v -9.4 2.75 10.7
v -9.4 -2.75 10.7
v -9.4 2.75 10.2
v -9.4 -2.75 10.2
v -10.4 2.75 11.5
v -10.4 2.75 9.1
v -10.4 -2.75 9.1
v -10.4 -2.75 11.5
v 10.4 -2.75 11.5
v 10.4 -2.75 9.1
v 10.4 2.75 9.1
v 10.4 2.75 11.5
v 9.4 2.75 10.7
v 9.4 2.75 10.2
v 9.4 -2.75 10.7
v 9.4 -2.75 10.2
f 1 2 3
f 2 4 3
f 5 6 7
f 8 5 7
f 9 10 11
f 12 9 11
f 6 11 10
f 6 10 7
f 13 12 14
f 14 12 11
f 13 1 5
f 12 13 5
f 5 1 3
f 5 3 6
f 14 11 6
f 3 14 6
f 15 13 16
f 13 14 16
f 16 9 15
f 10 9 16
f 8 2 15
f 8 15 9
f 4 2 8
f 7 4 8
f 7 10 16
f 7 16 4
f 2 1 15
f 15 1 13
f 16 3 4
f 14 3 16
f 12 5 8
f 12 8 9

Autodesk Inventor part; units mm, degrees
ref_plane "YZ Plane" through (0, 0, 0) normal (1, 0, 0) x (0, 1, 0)
ref_plane "XZ Plane" through (0, 0, 0) normal (0, 1, 0) x (-1, 0, 0)
sketch "Sketch1" plane through (0, 0, 0) normal (0, 0, 1) x (1, 0, 0)
  line L0 (-10.4, -2.75) -> (10.4, -2.75)
  line L1 (10.4, -2.75) -> (10.4, 2.75)
  line L2 (10.4, 2.75) -> (-10.4, 2.75)
  line L3 (-10.4, 2.75) -> (-10.4, -2.75)
  point P0 (0, 0)
  dimension "d268" = 5.5
  dimension "d269" = 2.75
  dimension "d270" = 20.8
  dimension "d271" = 10.4
extrude "Extrusion1" add sketch "Sketch1" along normal blind 10.2
sketch "Sketch2" plane through (-6.98, -2.75, 0) normal (0, -1, 0) x (1, 0, 0)
  line L0 (0, 0) -> (13.96, 0) projected
  line L1 (5.18, 3.6) -> (8.78, 3.6)
  line L2 (8.78, 3.6) -> (8.78, 0.5)
  line L3 (8.28, 0) -> (5.68, 0)
  line L4 (5.18, 0.5) -> (5.18, 3.6)
  line L5 (5.18, 0.5) -> (5.68, 0)
  line L6 (8.78, 0.5) -> (8.28, 0)
  point P0 (6.98, 0)
  dimension "d15" = 3.6
  dimension "d17" = 0.5
  dimension "d19" = 135
  dimension "d20" = 135
  dimension "d21" = 0.5
  dimension "d22" = 3.6
extrude "Extrusion2" [suppressed]
sketch "Sketch3" plane through (0, 0, 0) normal (0, 1, 0) x (-1, 0, 0)
  line L0 (-6.98, 3.6) -> (-7.23, 3.6)
  line L1 (-7.98, 2.1) -> (-7.98, 1.22)
  line L2 (-7.98, 1.22) -> (-6.98, 1.22)
  line L3 (-6.98, 1.22) -> (-6.98, 3.6)
  line L4 (6.98, 10.2) -> (-6.98, 10.2) projected
  line L5 (0, 10.2) -> (0, 0)
  line L6 (-6.98, 0) -> (6.98, 0) projected
  line L7 (-7.23, 3.6) -> (-7.98, 2.1)
  line L8 (6.98, 3.6) -> (7.23, 3.6)
  line L9 (7.98, 2.1) -> (7.98, 1.22)
  line L10 (7.98, 1.22) -> (6.98, 1.22)
  line L11 (6.98, 1.22) -> (6.98, 3.6)
  line L12 (7.23, 3.6) -> (7.98, 2.1)
  dimension "d25" = 13.96
  dimension "d26" = 1.22
  dimension "d28" = 1
  dimension "d29" = 1.5
  dimension "d30" = 0.88
  dimension "d31" = 0.25
extrude "Extrusion3" [suppressed]
sketch "Sketch4" plane through (0, -0.5, 0) normal (0, -1, 0) x (1, 0, 0)
  line L0 (6.98, 3.6) -> (7.23, 3.6) projected
  line L1 (6.98, 6.263) -> (7.23, 6.263)
  line L2 (7.98, 5.513) -> (7.98, 5.263)
  line L3 (7.98, 5.263) -> (6.98, 5.263)
  line L4 (6.98, 5.263) -> (6.98, 6.263)
  line L5 (-6.98, 10.2) -> (6.98, 10.2) projected
  line L6 (6.98, 0) -> (-6.98, 0) projected
  line L7 (0, 10.2) -> (0, 0)
  line L8 (7.23, 6.263) -> (7.98, 5.513)
  line L9 (-6.98, 6.263) -> (-7.23, 6.263)
  line L10 (-7.98, 5.513) -> (-7.98, 5.263)
  line L11 (-7.98, 5.263) -> (-6.98, 5.263)
  line L12 (-6.98, 5.263) -> (-6.98, 6.263)
  line L13 (-7.23, 6.263) -> (-7.98, 5.513)
  dimension "d34" = 1.663
  dimension "d35" = 13.96
  dimension "d36" = 1
  dimension "d38" = 0.25
  dimension "d39" = 1
  dimension "d40" = 0.25
extrude "Extrusion4" [suppressed]
sketch "Sketch5" plane through (0, 0.5, 0) normal (0, 1, 0) x (1, 0, 0)
  line L0 (7.23, -3.6) -> (6.98, -3.6) projected
  line L1 (7.23, -6.263) -> (6.98, -6.263)
  line L2 (6.98, -6.263) -> (6.98, -5.263)
  line L3 (6.98, -5.263) -> (7.98, -5.263)
  line L4 (7.98, -5.263) -> (7.98, -5.513)
  line L5 (6.98, -10.2) -> (-6.98, -10.2) projected
  line L6 (1.3, 0) -> (-1.3, 0) projected
  line L7 (0, 0) -> (0, -10.2)
  line L8 (7.23, -6.263) -> (7.98, -5.513)
  line L9 (-7.23, -6.263) -> (-6.98, -6.263)
  line L10 (-6.98, -6.263) -> (-6.98, -5.263)
  line L11 (-6.98, -5.263) -> (-7.98, -5.263)
  line L12 (-7.98, -5.263) -> (-7.98, -5.513)
  line L13 (-7.23, -6.263) -> (-7.98, -5.513)
  dimension "d43" = 1.663
  dimension "d44" = 13.96
  dimension "d45" = 1
  dimension "d46" = 1
  dimension "d47" = 0.25
  dimension "d48" = 0.25
extrude "Extrusion5" [suppressed]
sketch "Sketch6" plane through (-6.98, -2.75, 10.2) normal (0, -1, 0) x (1, 0, 0)
  line L0 (0, -10.2) -> (5.68, -10.2) projected
  line L1 (-38.97, -10.2) -> (-36.97, -6.7359)
  line L2 (-36.97, -6.7359) -> (-34.97, -10.2)
  line L3 (-38.97, -10.2) -> (-34.97, -10.2)
  line L4 (0.5, -10.2) -> (2.5, -6.7359)
  line L5 (2.5, -6.7359) -> (4.5, -10.2)
  line L6 (0.5, -10.2) -> (4.5, -10.2)
  dimension "d61" = 0.5
  dimension "d62" = 4
extrude "Extrusion6" [suppressed]
sketch "Sketch7" plane through (0, 0, 0) normal (0, 0, -1) x (-1, 0, 0)
  line L0 (6.98, 2.75) -> (6.98, -1.25) projected
  line L1 (4.705, 1.645) -> (5.455, 1.645)
  line L2 (5.455, 1.645) -> (5.455, 0.895)
  line L3 (5.455, 0.895) -> (4.705, 0.895)
  line L4 (4.705, 0.895) -> (4.705, 1.645)
  line L5 (4.705, -0.895) -> (5.455, -0.895)
  line L6 (5.455, -0.895) -> (5.455, -1.645)
  line L7 (5.455, -1.645) -> (4.705, -1.645)
  line L8 (4.705, -1.645) -> (4.705, -0.895)
  line L9 (5.08, 0.895) -> (5.08, -0.895) construction
  point P0 (0, 0)
  point P1 (5.08, 0)
  dimension "d65" = 0.75
  dimension "d66" = 2.54
  dimension "d67" = 1.525
extrude "Extrusion7" [suppressed]
chamfer "Chamfer1" [suppressed]
pattern_linear "Rectangular Pattern1" [suppressed]
ref_plane "Work Plane1" through (0, 0, 10.7) normal (0, 0, 1) x (1, 0, 0)
sketch "Sketch8" plane through (0, 0, 10.7) normal (0, 0, 1) x (1, 0, 0)
  line L0 (-6.98, 2.75) -> (6.98, 2.75) projected
  line L1 (-6.98, -2.75) -> (-6.98, 2.75) projected
  line L2 (6.98, -2.75) -> (-6.98, -2.75) projected
  line L3 (6.98, 2.75) -> (6.98, -2.75) projected
  line L4 (-7.11, 0) -> (-42.9538, 0)
  line L5 (-10.4, -2.75) -> (-10.4, 2.75) projected
  line L6 (10.4, -2.75) -> (-10.4, -2.75) projected
  line L7 (10.4, 2.75) -> (10.4, -2.75) projected
  line L8 (-10.4, 2.75) -> (10.4, 2.75) projected
  line L9 (10.4, 2.75) -> (-10.4, 2.75) projected
  line L10 (10.4, -2.75) -> (-10.4, -2.75)
  line L11 (-10.4, -2.75) -> (-10.4, 2.75)
  line L12 (-10.4, 2.75) -> (10.4, 2.75)
  line L13 (10.4, 2.75) -> (10.4, -2.75)
extrude "Extrusion20" add sketch "Sketch8" along normal blind 0.8
sketch "Sketch22" plane through (0, 0, 0) normal (0, 0, -1) x (-1, 0, 0)
  line L0 (-7.99, -3) -> (-8.665, -3) projected
  line L1 (8.665, 2.75) -> (-8.665, 2.75) projected
  line L2 (-8.665, -3) -> (8.665, -3)
  line L3 (8.665, -3) -> (8.665, 2.75)
  line L4 (8.665, 2.75) -> (-8.665, 2.75)
  line L5 (-8.665, 2.75) -> (-8.665, -3)
  point P0 (0, 0)
extrude "Extrusion17" [suppressed]
sketch "Sketch25" plane through (0, 0, 0) normal (0, 0, -1) x (-1, 0, 0)
  line L0 (10.4, -2.75) -> (-10.4, -2.75) projected
  line L1 (10.4, 2.75) -> (10.4, -2.75) projected
  line L2 (-10.4, 2.75) -> (10.4, 2.75) projected
  line L3 (-10.4, -2.75) -> (-10.4, 2.75) projected
  line L4 (10.4, -2.75) -> (-10.4, -2.75)
  line L5 (-10.4, -2.75) -> (-10.4, 2.75)
  line L6 (-10.4, 2.75) -> (10.4, 2.75)
  line L7 (10.4, 2.75) -> (10.4, -2.75)
  point P0 (0, 0)
extrude "Extrusion21" cut sketch "Sketch25" against normal blind 9.1
sketch "Sketch26" plane through (0, 0, 10.2) normal (0, 0, 1) x (1, 0, 0)
  line L0 (10.4, -2.75) -> (-10.4, -2.75) projected
  line L1 (10.4, 2.75) -> (-10.4, 2.75) projected
  line L2 (-10.4, -2.75) -> (-9.4, -2.75)
  line L3 (-9.4, -2.75) -> (-9.4, 2.75)
  line L4 (-9.4, 2.75) -> (-10.4, 2.75)
  line L5 (-10.4, 2.75) -> (-10.4, -2.75)
  point P0 (0, 0)
  dimension "d276" = 1
extrude "Extrusion22" add sketch "Sketch26" along normal blind 0.5
mirror "Mirror1" about plane through (0, 0, 0) normal (1, 0, 0) of "Extrusion22"
equation "\"DimA\" = 13.96"
equation "\"DimB\" = 17.33"
equation "\"DimC\" = 5.715"
properties part number "RC CON_10CKT"
